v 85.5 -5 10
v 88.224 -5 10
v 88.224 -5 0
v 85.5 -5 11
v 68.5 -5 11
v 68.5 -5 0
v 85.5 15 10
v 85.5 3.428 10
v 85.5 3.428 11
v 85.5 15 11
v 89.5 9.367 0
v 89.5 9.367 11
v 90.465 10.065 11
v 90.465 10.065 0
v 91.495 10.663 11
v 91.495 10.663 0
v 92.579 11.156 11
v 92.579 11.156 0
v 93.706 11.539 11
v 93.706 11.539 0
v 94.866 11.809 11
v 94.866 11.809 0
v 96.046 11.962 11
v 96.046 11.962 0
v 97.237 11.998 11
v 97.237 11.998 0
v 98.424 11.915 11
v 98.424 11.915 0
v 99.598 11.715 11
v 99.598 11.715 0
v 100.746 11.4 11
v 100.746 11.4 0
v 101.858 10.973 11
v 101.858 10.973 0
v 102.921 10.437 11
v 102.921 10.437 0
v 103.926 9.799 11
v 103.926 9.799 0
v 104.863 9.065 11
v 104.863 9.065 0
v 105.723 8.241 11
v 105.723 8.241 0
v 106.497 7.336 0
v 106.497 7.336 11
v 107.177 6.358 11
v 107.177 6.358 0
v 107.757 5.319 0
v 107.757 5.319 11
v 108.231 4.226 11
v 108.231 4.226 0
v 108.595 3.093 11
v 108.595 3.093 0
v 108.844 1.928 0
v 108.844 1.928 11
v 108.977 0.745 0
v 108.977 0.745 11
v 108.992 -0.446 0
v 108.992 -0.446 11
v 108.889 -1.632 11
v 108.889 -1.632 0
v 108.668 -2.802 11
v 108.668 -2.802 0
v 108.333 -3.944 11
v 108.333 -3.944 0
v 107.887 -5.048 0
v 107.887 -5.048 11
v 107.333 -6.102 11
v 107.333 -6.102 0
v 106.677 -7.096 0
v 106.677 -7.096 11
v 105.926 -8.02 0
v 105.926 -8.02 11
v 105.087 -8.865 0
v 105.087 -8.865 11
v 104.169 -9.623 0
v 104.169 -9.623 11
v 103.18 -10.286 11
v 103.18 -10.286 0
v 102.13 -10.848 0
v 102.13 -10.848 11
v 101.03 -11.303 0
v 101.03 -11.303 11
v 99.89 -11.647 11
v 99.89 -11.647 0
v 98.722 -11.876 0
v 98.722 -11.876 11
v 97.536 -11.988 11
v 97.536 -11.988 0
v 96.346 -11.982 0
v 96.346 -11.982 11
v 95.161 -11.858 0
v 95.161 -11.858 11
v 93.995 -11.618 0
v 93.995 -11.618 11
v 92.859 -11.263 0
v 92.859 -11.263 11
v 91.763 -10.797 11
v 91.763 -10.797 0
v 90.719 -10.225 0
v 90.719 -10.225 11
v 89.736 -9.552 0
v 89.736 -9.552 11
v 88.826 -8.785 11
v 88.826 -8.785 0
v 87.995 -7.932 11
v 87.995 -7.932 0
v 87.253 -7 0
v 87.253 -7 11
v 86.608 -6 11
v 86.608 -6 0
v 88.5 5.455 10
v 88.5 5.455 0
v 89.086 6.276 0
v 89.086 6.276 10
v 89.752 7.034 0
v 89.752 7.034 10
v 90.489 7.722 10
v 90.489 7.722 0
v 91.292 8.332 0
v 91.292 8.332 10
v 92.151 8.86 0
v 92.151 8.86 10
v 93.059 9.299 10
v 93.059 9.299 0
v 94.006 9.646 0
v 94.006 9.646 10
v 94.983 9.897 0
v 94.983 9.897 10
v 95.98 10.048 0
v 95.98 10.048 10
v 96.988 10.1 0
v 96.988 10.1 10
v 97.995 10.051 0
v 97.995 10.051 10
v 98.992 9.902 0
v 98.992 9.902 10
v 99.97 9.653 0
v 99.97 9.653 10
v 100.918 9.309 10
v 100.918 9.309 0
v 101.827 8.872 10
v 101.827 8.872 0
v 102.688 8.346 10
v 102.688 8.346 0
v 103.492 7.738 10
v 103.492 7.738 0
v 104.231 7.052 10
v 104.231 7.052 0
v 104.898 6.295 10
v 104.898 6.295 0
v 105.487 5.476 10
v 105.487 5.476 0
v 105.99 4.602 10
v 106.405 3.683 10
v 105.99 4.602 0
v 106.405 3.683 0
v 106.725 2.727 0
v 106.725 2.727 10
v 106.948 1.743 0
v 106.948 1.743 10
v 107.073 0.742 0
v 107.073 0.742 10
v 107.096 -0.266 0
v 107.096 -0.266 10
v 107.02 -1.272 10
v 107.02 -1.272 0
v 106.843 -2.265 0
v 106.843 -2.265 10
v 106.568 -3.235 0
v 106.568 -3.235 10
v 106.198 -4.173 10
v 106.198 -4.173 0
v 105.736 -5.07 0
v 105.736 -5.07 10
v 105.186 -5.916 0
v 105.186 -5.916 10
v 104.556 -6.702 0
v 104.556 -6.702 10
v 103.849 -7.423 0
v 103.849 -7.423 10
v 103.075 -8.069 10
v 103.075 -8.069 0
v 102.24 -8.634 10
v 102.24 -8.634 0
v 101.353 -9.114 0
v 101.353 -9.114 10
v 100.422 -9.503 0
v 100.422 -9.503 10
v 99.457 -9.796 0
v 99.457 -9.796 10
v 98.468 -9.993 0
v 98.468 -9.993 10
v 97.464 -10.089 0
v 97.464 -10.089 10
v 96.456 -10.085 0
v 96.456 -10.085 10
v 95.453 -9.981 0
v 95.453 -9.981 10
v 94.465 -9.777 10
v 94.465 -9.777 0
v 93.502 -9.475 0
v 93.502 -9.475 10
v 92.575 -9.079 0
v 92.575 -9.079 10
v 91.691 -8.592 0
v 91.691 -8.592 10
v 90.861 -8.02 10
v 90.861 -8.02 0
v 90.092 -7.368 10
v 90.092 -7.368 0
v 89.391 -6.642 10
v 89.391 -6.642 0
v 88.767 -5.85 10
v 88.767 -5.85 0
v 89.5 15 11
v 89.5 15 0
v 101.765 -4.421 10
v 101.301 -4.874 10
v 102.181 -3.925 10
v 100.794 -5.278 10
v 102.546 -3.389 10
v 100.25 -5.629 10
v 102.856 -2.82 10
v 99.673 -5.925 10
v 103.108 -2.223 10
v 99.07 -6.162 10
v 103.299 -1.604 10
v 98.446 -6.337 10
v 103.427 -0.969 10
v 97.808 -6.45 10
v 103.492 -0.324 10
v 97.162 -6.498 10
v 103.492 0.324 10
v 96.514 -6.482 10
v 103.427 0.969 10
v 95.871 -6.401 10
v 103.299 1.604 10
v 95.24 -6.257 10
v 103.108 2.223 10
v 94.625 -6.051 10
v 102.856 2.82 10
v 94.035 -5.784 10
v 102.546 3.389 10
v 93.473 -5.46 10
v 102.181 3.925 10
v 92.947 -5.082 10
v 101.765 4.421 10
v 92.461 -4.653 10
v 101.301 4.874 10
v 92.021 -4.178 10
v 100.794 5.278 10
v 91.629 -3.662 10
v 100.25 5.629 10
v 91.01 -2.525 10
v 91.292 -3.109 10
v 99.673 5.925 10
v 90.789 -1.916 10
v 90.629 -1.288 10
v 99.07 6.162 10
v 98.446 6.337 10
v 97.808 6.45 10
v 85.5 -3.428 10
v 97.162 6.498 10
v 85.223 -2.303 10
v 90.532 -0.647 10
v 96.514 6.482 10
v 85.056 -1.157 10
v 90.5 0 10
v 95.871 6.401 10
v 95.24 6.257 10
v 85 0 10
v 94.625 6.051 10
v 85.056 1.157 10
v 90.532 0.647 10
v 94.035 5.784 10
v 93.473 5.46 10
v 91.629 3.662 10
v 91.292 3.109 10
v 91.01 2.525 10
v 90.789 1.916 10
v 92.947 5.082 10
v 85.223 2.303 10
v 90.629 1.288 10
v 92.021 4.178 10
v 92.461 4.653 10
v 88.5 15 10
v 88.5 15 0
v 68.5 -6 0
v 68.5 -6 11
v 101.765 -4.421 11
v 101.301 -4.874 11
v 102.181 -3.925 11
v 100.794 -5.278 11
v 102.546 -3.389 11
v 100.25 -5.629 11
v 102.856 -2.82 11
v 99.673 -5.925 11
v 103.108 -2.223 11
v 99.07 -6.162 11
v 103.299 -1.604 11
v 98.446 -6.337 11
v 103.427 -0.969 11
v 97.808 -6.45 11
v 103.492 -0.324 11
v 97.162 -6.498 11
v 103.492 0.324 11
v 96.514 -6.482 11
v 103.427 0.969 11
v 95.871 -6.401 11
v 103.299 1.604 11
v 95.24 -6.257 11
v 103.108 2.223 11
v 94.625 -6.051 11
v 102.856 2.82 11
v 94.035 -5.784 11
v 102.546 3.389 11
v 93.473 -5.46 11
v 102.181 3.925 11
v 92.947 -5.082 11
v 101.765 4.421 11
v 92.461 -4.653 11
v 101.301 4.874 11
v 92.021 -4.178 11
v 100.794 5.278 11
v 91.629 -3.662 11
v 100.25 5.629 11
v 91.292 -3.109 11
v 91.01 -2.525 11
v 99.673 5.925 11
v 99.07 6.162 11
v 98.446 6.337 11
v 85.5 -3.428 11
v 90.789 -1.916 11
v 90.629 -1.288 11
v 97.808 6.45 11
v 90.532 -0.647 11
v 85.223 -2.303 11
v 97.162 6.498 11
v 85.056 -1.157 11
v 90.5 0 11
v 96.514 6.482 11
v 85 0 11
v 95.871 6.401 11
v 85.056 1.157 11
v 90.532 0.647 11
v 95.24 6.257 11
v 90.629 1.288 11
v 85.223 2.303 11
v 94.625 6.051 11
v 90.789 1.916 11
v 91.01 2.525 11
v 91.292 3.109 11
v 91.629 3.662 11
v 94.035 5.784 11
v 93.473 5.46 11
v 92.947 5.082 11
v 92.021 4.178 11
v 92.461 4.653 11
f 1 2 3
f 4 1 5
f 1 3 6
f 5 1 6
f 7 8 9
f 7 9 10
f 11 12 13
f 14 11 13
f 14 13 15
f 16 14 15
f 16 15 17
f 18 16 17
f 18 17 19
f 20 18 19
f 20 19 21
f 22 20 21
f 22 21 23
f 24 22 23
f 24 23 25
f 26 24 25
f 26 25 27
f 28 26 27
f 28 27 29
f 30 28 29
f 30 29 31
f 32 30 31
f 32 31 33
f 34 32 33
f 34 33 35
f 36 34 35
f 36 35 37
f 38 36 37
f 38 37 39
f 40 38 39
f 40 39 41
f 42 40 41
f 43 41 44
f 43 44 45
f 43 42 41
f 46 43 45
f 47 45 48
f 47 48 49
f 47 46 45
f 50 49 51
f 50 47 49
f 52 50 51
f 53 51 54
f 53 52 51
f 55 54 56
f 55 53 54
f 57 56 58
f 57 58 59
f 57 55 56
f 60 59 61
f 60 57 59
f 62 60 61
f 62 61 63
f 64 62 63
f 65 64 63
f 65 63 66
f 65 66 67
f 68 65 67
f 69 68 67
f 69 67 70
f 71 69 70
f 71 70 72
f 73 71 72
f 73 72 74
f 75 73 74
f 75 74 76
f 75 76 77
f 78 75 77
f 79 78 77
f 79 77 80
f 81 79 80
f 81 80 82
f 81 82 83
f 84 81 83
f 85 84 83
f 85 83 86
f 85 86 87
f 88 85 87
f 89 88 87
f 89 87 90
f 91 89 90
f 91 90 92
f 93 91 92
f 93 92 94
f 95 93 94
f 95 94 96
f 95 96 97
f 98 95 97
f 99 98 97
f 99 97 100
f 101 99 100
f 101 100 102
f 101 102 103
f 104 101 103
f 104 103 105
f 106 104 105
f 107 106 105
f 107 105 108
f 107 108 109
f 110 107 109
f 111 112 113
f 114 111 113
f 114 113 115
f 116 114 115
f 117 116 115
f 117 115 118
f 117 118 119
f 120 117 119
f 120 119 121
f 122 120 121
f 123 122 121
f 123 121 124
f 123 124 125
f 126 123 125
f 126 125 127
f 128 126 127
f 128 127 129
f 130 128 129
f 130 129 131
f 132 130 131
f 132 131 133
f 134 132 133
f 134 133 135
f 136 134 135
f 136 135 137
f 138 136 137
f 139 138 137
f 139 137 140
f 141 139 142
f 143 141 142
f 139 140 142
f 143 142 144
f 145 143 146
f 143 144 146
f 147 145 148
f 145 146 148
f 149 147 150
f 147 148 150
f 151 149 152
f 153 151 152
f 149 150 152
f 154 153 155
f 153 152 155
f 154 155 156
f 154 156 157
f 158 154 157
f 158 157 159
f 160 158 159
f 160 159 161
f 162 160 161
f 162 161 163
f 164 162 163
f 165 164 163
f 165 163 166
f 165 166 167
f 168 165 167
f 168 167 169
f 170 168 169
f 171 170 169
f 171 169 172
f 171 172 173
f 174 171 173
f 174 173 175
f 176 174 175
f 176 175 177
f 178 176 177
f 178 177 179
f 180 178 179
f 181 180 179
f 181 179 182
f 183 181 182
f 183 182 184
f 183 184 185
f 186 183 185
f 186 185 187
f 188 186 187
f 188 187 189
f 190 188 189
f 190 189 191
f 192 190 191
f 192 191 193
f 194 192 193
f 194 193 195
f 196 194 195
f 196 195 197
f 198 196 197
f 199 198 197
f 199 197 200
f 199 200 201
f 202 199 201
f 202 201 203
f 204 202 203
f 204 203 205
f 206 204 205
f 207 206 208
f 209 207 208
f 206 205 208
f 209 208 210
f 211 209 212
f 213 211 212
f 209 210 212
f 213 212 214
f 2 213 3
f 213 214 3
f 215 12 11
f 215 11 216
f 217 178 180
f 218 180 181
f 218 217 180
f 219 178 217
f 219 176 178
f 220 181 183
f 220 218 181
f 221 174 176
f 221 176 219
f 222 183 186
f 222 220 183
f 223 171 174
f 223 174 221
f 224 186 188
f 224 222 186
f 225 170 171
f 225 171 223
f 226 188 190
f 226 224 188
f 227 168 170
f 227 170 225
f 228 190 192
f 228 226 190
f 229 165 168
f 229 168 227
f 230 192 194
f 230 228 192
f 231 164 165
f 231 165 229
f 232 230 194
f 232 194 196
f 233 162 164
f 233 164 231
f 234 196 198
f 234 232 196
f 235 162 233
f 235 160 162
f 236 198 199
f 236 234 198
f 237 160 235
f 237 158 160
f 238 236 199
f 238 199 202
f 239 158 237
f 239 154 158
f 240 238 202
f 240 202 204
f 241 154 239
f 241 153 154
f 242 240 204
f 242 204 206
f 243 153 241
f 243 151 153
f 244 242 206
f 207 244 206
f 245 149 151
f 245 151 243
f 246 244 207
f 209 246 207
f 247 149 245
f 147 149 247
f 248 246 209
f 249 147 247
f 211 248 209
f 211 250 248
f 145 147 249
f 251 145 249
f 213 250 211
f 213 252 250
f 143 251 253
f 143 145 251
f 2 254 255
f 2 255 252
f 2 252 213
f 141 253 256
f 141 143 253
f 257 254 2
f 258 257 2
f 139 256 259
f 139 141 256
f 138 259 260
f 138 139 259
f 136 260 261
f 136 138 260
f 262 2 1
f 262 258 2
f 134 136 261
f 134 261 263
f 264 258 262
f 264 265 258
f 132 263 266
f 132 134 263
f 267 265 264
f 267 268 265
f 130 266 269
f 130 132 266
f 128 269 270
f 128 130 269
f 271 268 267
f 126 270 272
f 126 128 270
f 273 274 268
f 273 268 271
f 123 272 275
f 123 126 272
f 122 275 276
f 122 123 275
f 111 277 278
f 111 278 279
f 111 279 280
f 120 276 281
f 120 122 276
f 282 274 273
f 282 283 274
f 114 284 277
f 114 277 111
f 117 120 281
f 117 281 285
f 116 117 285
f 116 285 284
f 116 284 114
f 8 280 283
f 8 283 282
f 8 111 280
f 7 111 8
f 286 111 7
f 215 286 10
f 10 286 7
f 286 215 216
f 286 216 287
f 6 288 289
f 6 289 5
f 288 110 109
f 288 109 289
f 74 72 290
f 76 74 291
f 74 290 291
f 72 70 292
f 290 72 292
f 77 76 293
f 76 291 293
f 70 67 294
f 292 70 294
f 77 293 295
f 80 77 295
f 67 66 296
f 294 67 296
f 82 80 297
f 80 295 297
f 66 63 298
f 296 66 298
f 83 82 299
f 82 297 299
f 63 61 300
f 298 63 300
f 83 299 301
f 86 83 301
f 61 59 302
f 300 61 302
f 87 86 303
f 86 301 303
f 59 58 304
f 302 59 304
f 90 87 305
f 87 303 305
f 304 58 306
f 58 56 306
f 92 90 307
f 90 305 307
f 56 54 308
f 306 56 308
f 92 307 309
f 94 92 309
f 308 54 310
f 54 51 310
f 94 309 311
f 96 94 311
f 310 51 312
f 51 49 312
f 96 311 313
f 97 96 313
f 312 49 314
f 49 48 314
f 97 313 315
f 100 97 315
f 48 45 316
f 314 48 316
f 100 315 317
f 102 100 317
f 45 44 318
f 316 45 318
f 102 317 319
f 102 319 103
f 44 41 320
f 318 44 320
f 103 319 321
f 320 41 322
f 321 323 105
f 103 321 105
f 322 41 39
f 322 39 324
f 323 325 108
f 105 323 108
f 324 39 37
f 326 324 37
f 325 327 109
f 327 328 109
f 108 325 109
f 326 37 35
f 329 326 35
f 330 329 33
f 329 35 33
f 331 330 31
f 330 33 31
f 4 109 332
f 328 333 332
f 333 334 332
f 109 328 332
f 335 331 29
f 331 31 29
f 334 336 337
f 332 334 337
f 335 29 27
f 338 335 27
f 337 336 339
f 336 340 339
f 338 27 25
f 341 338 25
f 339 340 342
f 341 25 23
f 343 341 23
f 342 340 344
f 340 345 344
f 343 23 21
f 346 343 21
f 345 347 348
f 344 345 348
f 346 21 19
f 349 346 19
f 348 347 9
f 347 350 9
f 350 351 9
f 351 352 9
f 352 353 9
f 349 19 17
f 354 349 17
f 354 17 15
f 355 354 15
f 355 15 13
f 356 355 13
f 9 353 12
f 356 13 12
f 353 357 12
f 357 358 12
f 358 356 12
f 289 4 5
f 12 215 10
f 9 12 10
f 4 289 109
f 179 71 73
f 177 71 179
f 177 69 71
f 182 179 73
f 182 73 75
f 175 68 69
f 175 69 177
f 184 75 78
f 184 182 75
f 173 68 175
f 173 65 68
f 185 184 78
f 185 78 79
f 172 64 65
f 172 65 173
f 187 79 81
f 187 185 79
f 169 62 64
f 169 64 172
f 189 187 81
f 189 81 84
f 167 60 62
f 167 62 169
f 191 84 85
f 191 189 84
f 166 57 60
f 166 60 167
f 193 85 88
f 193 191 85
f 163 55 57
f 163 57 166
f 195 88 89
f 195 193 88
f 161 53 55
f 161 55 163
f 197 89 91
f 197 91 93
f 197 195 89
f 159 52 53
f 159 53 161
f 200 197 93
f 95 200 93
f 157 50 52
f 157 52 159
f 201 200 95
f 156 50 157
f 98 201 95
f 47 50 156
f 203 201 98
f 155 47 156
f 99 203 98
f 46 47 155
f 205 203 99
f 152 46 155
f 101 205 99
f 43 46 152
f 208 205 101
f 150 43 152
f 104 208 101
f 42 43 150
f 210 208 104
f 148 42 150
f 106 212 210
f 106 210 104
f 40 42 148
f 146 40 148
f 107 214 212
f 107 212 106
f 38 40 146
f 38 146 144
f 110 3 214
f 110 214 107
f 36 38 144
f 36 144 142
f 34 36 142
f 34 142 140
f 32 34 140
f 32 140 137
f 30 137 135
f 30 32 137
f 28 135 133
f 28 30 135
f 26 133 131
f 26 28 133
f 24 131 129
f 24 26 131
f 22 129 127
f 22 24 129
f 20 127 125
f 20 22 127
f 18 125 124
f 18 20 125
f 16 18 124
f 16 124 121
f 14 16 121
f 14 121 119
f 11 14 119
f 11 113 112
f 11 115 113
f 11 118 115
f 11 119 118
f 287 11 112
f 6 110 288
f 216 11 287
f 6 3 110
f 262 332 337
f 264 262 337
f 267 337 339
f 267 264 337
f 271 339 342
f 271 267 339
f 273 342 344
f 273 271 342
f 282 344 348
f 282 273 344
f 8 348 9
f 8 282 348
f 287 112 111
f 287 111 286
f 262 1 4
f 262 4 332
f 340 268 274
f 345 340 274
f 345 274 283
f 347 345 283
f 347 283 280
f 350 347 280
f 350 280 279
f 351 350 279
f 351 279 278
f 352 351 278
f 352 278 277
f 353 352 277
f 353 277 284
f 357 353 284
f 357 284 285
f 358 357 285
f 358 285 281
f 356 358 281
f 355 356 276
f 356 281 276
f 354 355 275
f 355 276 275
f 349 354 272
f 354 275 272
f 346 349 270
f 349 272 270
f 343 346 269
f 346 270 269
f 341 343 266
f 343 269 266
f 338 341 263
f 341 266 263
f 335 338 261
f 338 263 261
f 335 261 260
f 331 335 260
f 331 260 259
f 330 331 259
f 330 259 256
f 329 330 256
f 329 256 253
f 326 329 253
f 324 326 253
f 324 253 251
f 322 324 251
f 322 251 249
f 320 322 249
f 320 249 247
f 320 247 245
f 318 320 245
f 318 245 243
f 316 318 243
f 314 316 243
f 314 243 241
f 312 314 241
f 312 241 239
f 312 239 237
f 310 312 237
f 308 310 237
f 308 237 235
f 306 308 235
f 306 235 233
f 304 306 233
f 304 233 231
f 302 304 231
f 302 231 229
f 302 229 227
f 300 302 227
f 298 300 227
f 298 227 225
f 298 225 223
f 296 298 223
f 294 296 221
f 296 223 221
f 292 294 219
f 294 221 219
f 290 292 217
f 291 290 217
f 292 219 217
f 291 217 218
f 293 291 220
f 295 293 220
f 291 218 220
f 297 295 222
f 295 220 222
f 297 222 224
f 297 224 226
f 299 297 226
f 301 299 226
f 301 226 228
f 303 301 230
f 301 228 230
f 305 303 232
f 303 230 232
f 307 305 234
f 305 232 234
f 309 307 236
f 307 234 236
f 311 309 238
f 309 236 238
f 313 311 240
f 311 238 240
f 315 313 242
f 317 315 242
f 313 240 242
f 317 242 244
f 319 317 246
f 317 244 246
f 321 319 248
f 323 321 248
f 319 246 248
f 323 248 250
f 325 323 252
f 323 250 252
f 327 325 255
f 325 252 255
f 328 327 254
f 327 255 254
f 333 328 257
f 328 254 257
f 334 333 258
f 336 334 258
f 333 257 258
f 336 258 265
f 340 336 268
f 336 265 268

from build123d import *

# Parameters (mm, degrees)
CYLINDER040_R     = 6.5
CYLINDER040_DEPTH = 11
CYLINDER026_R     = 2.5
CYLINDER026_DEPTH = 11
CYLINDER025_R     = 2.5
CYLINDER025_DEPTH = 11
BOX006_W          = 1
BOX006_H          = 7
BOX006_DEPTH      = 11
BOX_W             = 3
BOX_H             = 20
BOX_DEPTH         = 1
CYLINDER024_R     = 12
CYLINDER024_DEPTH = 1
PAD011_DEPTH      = 10
BOX005_W          = 177
BOX005_H          = 100
BOX005_DEPTH      = 10
CYLINDER018_R     = 7.5
CYLINDER018_DEPTH = 10
CYLINDER016_R     = 10
CYLINDER016_DEPTH = 10
CYLINDER017_R     = 7.5
CYLINDER017_DEPTH = 10
CYLINDER019_R     = 10
CYLINDER019_DEPTH = 10
PAD009_DEPTH      = 6.5
PAD008_DEPTH      = 4
PAD010_DEPTH      = 10
CYLINDER021_R     = 7.5
CYLINDER021_DEPTH = 10
CYLINDER020_R     = 10
CYLINDER020_DEPTH = 10
CYLINDER022_R     = 7.5
CYLINDER022_DEPTH = 10
CYLINDER023_R     = 10
CYLINDER023_DEPTH = 10
TUBE_R            = 12
TUBE_R_2          = 10.1
TUBE_DEPTH        = 10
BOX007_W          = 19
BOX007_H          = 1
BOX007_DEPTH      = 11


with BuildPart() as cilindro040:
    # Cylinder040 → Cylinder040 (new body)
    with BuildSketch(Plane(origin=(-97, 0, 0), x_dir=(1, 0, 0), z_dir=(0, 0, 1))):
        Circle(CYLINDER040_R)
    extrude(amount=CYLINDER040_DEPTH)


with BuildPart() as cilindro026:
    # Cylinder026 → Cylinder026 (new body)
    with BuildSketch(Plane(origin=(-83, 10, 0), x_dir=(1, 0, 0), z_dir=(0, 0, 1))):
        Circle(CYLINDER026_R)
    extrude(amount=CYLINDER026_DEPTH)


with BuildPart() as cilindro025:
    # Cylinder025 → Cylinder025 (new body)
    with BuildSketch(Plane(origin=(-75, 0, 0), x_dir=(1, 0, 0), z_dir=(0, 0, 1))):
        Circle(CYLINDER025_R)
    extrude(amount=CYLINDER025_DEPTH)


with BuildPart() as cubo002:
    # Box006 → Box006 (new body)
    with BuildSketch(Plane(origin=(-89.5, 8, 0), x_dir=(1, 0, 0), z_dir=(0, 0, 1))):
        with Locations((0.5, 3.5)):
            Rectangle(BOX006_W, BOX006_H)
    extrude(amount=BOX006_DEPTH)


with BuildPart() as cubo001:
    # Box → Box (new body)
    with BuildSketch(Plane(origin=(-88.5, -5, 10), x_dir=(1, 0, 0), z_dir=(0, 0, 1))):
        with Locations((1.5, 10)):
            Rectangle(BOX_W, BOX_H)
    extrude(amount=BOX_DEPTH)


with BuildPart() as cilindro024:
    # Cylinder024 → Cylinder024 (new body)
    with BuildSketch(Plane(origin=(-97, 0, 10), x_dir=(1, 0, 0), z_dir=(0, 0, 1))):
        Circle(CYLINDER024_R)
    extrude(amount=CYLINDER024_DEPTH)


with BuildPart() as body008:
    # Sketch011 → Pad011 (new body)
    with BuildSketch(Plane.XY):
        Polygon((8.5, 4.907477), (0, 9.814955), (-8.5, 4.907477), (-8.5, -4.907477), (0, -9.814955), (8.5, -4.907477), align=None)
    extrude(amount=PAD011_DEPTH)


with BuildPart() as body008_1:
    # Body008 placement: moved
    add(body008.part.moved(Location((0, 45.1, 0))))


with BuildPart() as cut018:
    # Box005 → Box005 (new body)
    with BuildSketch(Plane(origin=(-88.5, -5, 0), x_dir=(1, 0, 0), z_dir=(0, 0, 1))):
        with Locations((88.5, 50)):
            Rectangle(BOX005_W, BOX005_H)
    extrude(amount=BOX005_DEPTH)

    # Cut018: cut Body008
    add(body008_1.part, mode=Mode.SUBTRACT)


with BuildPart() as cilindro018:
    # Cylinder018 → Cylinder018 (new body)
    with BuildSketch(Plane(origin=(0, 20, 0), x_dir=(1, 0, 0), z_dir=(0, 0, 1))):
        Circle(CYLINDER018_R)
    extrude(amount=CYLINDER018_DEPTH)


with BuildPart() as unionbarra006:
    # Cylinder016 → Cylinder016 (new body)
    with BuildSketch(Plane(origin=(0, 20, 0), x_dir=(1, 0, 0), z_dir=(0, 0, 1))):
        Circle(CYLINDER016_R)
    extrude(amount=CYLINDER016_DEPTH)

    # Cut014: cut Cilindro018
    add(cilindro018.part, mode=Mode.SUBTRACT)


with BuildPart() as unionbarra006_1:
    # Cut014 placement: moved
    add(unionbarra006.part.moved(Location((-97, -20, 0))))


with BuildPart() as cilindro017:
    # Cylinder017 → Cylinder017 (new body)
    with BuildSketch(Plane(origin=(0, 20, 0), x_dir=(1, 0, 0), z_dir=(0, 0, 1))):
        Circle(CYLINDER017_R)
    extrude(amount=CYLINDER017_DEPTH)


with BuildPart() as fusion007:
    # Cylinder019 → Cylinder019 (new body)
    with BuildSketch(Plane(origin=(0, 20, 0), x_dir=(1, 0, 0), z_dir=(0, 0, 1))):
        Circle(CYLINDER019_R)
    extrude(amount=CYLINDER019_DEPTH)

    # Cut015: cut Cilindro017
    add(cilindro017.part, mode=Mode.SUBTRACT)


with BuildPart() as fusion007_1:
    # Cut015 placement: moved
    add(fusion007.part.moved(Location((97, -20, 0))))

    # Fusion007: union unionbarra006
    add(unionbarra006_1.part)


with BuildPart() as cuerpo005:
    # Sketch010 → Pad009 (new body)
    with BuildSketch(Plane.XY):
        Polygon((0, 7.505553), (-6.5, 3.752777), (-6.5, -3.752777), (0, -7.505553), (6.5, -3.752777), (6.5, 3.752777), align=None)
    extrude(amount=PAD009_DEPTH)

    # Sketch009 (on Face8 of Pad009) → Pad008 (join)
    with BuildSketch(Plane.XY.offset(6.5)):
        Polygon((0, 5.773503), (-5, 2.886751), (-5, -2.886751), (0, -5.773503), (5, -2.886751), (5, 2.886751), align=None)
    extrude(amount=PAD008_DEPTH)


with BuildPart() as cut016:
    # Sketch008 → Pad010 (new body)
    with BuildSketch(Plane.XY):
        Polygon((0, 9.814955), (-8.5, 4.907477), (-8.5, -4.907477), (0, -9.814955), (8.5, -4.907477), (8.5, 4.907477), align=None)
    extrude(amount=PAD010_DEPTH)

    # Cut016: cut Cuerpo005
    add(cuerpo005.part, mode=Mode.SUBTRACT)


with BuildPart() as cut016_1:
    # Cut016 placement: moved
    add(cut016.part.moved(Location((0, 45.1, 0))))


with BuildPart() as cilindro021:
    # Cylinder021 → Cylinder021 (new body)
    with BuildSketch(Plane(origin=(0, 20, 0), x_dir=(1, 0, 0), z_dir=(0, 0, 1))):
        Circle(CYLINDER021_R)
    extrude(amount=CYLINDER021_DEPTH)


with BuildPart() as unionbarra008:
    # Cylinder020 → Cylinder020 (new body)
    with BuildSketch(Plane(origin=(0, 20, 0), x_dir=(1, 0, 0), z_dir=(0, 0, 1))):
        Circle(CYLINDER020_R)
    extrude(amount=CYLINDER020_DEPTH)

    # Cut017: cut Cilindro021
    add(cilindro021.part, mode=Mode.SUBTRACT)


with BuildPart() as unionbarra008_1:
    # Cut017 placement: moved
    add(unionbarra008.part.moved(Location((-97, -20, 0))))


with BuildPart() as cilindro022:
    # Cylinder022 → Cylinder022 (new body)
    with BuildSketch(Plane(origin=(0, 20, 0), x_dir=(1, 0, 0), z_dir=(0, 0, 1))):
        Circle(CYLINDER022_R)
    extrude(amount=CYLINDER022_DEPTH)


with BuildPart() as fusion008:
    # Cylinder023 → Cylinder023 (new body)
    with BuildSketch(Plane(origin=(0, 20, 0), x_dir=(1, 0, 0), z_dir=(0, 0, 1))):
        Circle(CYLINDER023_R)
    extrude(amount=CYLINDER023_DEPTH)

    # Cut019: cut Cilindro022
    add(cilindro022.part, mode=Mode.SUBTRACT)


with BuildPart() as fusion008_1:
    # Cut019 placement: moved
    add(fusion008.part.moved(Location((97, -20, 0))))

    # Fusion009: union unionbarra008
    add(unionbarra008_1.part)


with BuildPart() as fusion008_2:
    # Fusion009 placement: moved
    add(fusion008_1.part.moved(Location((0, 90, 0))))

    # Fusion008: union Cut018, Fusion007, Cut016
    add(cut018.part)
    add(fusion007_1.part)
    add(cut016_1.part)


with BuildPart() as cut020:
    # Tube → Tube (new body)
    with BuildSketch(Plane(origin=(-97, 0, 0), x_dir=(1, 0, 0), z_dir=(0, 0, 1))):
        Circle(TUBE_R)
        Circle(TUBE_R_2, mode=Mode.SUBTRACT)
    extrude(amount=TUBE_DEPTH)

    # Cut020: cut Fusion008
    add(fusion008_2.part, mode=Mode.SUBTRACT)


with BuildPart() as cut034:
    # Box007 → Box007 (new body)
    with BuildSketch(Plane(origin=(-87.5, -6, 0), x_dir=(1, 0, 0), z_dir=(0, 0, 1))):
        with Locations((9.5, 0.5)):
            Rectangle(BOX007_W, BOX007_H)
    extrude(amount=BOX007_DEPTH)

    # Fusion010: union Cubo002, Cubo001, Cilindro024, Cut020
    add(cubo002.part)
    add(cubo001.part)
    add(cilindro024.part)
    add(cut020.part)

    # Cut021: cut Cilindro025
    add(cilindro025.part, mode=Mode.SUBTRACT)

    # Cut022: cut Cilindro026
    add(cilindro026.part, mode=Mode.SUBTRACT)

    # Cut034: cut Cilindro040
    add(cilindro040.part, mode=Mode.SUBTRACT)


with BuildPart() as part_mirroring:
    # Part__Mirroring: instance of Cut034
    add(cut034.part.mirror(Plane(origin=(0, 0, 0), x_dir=(0, -1, 0), z_dir=(1, 0, 0))))


solid = part_mirroring.part
